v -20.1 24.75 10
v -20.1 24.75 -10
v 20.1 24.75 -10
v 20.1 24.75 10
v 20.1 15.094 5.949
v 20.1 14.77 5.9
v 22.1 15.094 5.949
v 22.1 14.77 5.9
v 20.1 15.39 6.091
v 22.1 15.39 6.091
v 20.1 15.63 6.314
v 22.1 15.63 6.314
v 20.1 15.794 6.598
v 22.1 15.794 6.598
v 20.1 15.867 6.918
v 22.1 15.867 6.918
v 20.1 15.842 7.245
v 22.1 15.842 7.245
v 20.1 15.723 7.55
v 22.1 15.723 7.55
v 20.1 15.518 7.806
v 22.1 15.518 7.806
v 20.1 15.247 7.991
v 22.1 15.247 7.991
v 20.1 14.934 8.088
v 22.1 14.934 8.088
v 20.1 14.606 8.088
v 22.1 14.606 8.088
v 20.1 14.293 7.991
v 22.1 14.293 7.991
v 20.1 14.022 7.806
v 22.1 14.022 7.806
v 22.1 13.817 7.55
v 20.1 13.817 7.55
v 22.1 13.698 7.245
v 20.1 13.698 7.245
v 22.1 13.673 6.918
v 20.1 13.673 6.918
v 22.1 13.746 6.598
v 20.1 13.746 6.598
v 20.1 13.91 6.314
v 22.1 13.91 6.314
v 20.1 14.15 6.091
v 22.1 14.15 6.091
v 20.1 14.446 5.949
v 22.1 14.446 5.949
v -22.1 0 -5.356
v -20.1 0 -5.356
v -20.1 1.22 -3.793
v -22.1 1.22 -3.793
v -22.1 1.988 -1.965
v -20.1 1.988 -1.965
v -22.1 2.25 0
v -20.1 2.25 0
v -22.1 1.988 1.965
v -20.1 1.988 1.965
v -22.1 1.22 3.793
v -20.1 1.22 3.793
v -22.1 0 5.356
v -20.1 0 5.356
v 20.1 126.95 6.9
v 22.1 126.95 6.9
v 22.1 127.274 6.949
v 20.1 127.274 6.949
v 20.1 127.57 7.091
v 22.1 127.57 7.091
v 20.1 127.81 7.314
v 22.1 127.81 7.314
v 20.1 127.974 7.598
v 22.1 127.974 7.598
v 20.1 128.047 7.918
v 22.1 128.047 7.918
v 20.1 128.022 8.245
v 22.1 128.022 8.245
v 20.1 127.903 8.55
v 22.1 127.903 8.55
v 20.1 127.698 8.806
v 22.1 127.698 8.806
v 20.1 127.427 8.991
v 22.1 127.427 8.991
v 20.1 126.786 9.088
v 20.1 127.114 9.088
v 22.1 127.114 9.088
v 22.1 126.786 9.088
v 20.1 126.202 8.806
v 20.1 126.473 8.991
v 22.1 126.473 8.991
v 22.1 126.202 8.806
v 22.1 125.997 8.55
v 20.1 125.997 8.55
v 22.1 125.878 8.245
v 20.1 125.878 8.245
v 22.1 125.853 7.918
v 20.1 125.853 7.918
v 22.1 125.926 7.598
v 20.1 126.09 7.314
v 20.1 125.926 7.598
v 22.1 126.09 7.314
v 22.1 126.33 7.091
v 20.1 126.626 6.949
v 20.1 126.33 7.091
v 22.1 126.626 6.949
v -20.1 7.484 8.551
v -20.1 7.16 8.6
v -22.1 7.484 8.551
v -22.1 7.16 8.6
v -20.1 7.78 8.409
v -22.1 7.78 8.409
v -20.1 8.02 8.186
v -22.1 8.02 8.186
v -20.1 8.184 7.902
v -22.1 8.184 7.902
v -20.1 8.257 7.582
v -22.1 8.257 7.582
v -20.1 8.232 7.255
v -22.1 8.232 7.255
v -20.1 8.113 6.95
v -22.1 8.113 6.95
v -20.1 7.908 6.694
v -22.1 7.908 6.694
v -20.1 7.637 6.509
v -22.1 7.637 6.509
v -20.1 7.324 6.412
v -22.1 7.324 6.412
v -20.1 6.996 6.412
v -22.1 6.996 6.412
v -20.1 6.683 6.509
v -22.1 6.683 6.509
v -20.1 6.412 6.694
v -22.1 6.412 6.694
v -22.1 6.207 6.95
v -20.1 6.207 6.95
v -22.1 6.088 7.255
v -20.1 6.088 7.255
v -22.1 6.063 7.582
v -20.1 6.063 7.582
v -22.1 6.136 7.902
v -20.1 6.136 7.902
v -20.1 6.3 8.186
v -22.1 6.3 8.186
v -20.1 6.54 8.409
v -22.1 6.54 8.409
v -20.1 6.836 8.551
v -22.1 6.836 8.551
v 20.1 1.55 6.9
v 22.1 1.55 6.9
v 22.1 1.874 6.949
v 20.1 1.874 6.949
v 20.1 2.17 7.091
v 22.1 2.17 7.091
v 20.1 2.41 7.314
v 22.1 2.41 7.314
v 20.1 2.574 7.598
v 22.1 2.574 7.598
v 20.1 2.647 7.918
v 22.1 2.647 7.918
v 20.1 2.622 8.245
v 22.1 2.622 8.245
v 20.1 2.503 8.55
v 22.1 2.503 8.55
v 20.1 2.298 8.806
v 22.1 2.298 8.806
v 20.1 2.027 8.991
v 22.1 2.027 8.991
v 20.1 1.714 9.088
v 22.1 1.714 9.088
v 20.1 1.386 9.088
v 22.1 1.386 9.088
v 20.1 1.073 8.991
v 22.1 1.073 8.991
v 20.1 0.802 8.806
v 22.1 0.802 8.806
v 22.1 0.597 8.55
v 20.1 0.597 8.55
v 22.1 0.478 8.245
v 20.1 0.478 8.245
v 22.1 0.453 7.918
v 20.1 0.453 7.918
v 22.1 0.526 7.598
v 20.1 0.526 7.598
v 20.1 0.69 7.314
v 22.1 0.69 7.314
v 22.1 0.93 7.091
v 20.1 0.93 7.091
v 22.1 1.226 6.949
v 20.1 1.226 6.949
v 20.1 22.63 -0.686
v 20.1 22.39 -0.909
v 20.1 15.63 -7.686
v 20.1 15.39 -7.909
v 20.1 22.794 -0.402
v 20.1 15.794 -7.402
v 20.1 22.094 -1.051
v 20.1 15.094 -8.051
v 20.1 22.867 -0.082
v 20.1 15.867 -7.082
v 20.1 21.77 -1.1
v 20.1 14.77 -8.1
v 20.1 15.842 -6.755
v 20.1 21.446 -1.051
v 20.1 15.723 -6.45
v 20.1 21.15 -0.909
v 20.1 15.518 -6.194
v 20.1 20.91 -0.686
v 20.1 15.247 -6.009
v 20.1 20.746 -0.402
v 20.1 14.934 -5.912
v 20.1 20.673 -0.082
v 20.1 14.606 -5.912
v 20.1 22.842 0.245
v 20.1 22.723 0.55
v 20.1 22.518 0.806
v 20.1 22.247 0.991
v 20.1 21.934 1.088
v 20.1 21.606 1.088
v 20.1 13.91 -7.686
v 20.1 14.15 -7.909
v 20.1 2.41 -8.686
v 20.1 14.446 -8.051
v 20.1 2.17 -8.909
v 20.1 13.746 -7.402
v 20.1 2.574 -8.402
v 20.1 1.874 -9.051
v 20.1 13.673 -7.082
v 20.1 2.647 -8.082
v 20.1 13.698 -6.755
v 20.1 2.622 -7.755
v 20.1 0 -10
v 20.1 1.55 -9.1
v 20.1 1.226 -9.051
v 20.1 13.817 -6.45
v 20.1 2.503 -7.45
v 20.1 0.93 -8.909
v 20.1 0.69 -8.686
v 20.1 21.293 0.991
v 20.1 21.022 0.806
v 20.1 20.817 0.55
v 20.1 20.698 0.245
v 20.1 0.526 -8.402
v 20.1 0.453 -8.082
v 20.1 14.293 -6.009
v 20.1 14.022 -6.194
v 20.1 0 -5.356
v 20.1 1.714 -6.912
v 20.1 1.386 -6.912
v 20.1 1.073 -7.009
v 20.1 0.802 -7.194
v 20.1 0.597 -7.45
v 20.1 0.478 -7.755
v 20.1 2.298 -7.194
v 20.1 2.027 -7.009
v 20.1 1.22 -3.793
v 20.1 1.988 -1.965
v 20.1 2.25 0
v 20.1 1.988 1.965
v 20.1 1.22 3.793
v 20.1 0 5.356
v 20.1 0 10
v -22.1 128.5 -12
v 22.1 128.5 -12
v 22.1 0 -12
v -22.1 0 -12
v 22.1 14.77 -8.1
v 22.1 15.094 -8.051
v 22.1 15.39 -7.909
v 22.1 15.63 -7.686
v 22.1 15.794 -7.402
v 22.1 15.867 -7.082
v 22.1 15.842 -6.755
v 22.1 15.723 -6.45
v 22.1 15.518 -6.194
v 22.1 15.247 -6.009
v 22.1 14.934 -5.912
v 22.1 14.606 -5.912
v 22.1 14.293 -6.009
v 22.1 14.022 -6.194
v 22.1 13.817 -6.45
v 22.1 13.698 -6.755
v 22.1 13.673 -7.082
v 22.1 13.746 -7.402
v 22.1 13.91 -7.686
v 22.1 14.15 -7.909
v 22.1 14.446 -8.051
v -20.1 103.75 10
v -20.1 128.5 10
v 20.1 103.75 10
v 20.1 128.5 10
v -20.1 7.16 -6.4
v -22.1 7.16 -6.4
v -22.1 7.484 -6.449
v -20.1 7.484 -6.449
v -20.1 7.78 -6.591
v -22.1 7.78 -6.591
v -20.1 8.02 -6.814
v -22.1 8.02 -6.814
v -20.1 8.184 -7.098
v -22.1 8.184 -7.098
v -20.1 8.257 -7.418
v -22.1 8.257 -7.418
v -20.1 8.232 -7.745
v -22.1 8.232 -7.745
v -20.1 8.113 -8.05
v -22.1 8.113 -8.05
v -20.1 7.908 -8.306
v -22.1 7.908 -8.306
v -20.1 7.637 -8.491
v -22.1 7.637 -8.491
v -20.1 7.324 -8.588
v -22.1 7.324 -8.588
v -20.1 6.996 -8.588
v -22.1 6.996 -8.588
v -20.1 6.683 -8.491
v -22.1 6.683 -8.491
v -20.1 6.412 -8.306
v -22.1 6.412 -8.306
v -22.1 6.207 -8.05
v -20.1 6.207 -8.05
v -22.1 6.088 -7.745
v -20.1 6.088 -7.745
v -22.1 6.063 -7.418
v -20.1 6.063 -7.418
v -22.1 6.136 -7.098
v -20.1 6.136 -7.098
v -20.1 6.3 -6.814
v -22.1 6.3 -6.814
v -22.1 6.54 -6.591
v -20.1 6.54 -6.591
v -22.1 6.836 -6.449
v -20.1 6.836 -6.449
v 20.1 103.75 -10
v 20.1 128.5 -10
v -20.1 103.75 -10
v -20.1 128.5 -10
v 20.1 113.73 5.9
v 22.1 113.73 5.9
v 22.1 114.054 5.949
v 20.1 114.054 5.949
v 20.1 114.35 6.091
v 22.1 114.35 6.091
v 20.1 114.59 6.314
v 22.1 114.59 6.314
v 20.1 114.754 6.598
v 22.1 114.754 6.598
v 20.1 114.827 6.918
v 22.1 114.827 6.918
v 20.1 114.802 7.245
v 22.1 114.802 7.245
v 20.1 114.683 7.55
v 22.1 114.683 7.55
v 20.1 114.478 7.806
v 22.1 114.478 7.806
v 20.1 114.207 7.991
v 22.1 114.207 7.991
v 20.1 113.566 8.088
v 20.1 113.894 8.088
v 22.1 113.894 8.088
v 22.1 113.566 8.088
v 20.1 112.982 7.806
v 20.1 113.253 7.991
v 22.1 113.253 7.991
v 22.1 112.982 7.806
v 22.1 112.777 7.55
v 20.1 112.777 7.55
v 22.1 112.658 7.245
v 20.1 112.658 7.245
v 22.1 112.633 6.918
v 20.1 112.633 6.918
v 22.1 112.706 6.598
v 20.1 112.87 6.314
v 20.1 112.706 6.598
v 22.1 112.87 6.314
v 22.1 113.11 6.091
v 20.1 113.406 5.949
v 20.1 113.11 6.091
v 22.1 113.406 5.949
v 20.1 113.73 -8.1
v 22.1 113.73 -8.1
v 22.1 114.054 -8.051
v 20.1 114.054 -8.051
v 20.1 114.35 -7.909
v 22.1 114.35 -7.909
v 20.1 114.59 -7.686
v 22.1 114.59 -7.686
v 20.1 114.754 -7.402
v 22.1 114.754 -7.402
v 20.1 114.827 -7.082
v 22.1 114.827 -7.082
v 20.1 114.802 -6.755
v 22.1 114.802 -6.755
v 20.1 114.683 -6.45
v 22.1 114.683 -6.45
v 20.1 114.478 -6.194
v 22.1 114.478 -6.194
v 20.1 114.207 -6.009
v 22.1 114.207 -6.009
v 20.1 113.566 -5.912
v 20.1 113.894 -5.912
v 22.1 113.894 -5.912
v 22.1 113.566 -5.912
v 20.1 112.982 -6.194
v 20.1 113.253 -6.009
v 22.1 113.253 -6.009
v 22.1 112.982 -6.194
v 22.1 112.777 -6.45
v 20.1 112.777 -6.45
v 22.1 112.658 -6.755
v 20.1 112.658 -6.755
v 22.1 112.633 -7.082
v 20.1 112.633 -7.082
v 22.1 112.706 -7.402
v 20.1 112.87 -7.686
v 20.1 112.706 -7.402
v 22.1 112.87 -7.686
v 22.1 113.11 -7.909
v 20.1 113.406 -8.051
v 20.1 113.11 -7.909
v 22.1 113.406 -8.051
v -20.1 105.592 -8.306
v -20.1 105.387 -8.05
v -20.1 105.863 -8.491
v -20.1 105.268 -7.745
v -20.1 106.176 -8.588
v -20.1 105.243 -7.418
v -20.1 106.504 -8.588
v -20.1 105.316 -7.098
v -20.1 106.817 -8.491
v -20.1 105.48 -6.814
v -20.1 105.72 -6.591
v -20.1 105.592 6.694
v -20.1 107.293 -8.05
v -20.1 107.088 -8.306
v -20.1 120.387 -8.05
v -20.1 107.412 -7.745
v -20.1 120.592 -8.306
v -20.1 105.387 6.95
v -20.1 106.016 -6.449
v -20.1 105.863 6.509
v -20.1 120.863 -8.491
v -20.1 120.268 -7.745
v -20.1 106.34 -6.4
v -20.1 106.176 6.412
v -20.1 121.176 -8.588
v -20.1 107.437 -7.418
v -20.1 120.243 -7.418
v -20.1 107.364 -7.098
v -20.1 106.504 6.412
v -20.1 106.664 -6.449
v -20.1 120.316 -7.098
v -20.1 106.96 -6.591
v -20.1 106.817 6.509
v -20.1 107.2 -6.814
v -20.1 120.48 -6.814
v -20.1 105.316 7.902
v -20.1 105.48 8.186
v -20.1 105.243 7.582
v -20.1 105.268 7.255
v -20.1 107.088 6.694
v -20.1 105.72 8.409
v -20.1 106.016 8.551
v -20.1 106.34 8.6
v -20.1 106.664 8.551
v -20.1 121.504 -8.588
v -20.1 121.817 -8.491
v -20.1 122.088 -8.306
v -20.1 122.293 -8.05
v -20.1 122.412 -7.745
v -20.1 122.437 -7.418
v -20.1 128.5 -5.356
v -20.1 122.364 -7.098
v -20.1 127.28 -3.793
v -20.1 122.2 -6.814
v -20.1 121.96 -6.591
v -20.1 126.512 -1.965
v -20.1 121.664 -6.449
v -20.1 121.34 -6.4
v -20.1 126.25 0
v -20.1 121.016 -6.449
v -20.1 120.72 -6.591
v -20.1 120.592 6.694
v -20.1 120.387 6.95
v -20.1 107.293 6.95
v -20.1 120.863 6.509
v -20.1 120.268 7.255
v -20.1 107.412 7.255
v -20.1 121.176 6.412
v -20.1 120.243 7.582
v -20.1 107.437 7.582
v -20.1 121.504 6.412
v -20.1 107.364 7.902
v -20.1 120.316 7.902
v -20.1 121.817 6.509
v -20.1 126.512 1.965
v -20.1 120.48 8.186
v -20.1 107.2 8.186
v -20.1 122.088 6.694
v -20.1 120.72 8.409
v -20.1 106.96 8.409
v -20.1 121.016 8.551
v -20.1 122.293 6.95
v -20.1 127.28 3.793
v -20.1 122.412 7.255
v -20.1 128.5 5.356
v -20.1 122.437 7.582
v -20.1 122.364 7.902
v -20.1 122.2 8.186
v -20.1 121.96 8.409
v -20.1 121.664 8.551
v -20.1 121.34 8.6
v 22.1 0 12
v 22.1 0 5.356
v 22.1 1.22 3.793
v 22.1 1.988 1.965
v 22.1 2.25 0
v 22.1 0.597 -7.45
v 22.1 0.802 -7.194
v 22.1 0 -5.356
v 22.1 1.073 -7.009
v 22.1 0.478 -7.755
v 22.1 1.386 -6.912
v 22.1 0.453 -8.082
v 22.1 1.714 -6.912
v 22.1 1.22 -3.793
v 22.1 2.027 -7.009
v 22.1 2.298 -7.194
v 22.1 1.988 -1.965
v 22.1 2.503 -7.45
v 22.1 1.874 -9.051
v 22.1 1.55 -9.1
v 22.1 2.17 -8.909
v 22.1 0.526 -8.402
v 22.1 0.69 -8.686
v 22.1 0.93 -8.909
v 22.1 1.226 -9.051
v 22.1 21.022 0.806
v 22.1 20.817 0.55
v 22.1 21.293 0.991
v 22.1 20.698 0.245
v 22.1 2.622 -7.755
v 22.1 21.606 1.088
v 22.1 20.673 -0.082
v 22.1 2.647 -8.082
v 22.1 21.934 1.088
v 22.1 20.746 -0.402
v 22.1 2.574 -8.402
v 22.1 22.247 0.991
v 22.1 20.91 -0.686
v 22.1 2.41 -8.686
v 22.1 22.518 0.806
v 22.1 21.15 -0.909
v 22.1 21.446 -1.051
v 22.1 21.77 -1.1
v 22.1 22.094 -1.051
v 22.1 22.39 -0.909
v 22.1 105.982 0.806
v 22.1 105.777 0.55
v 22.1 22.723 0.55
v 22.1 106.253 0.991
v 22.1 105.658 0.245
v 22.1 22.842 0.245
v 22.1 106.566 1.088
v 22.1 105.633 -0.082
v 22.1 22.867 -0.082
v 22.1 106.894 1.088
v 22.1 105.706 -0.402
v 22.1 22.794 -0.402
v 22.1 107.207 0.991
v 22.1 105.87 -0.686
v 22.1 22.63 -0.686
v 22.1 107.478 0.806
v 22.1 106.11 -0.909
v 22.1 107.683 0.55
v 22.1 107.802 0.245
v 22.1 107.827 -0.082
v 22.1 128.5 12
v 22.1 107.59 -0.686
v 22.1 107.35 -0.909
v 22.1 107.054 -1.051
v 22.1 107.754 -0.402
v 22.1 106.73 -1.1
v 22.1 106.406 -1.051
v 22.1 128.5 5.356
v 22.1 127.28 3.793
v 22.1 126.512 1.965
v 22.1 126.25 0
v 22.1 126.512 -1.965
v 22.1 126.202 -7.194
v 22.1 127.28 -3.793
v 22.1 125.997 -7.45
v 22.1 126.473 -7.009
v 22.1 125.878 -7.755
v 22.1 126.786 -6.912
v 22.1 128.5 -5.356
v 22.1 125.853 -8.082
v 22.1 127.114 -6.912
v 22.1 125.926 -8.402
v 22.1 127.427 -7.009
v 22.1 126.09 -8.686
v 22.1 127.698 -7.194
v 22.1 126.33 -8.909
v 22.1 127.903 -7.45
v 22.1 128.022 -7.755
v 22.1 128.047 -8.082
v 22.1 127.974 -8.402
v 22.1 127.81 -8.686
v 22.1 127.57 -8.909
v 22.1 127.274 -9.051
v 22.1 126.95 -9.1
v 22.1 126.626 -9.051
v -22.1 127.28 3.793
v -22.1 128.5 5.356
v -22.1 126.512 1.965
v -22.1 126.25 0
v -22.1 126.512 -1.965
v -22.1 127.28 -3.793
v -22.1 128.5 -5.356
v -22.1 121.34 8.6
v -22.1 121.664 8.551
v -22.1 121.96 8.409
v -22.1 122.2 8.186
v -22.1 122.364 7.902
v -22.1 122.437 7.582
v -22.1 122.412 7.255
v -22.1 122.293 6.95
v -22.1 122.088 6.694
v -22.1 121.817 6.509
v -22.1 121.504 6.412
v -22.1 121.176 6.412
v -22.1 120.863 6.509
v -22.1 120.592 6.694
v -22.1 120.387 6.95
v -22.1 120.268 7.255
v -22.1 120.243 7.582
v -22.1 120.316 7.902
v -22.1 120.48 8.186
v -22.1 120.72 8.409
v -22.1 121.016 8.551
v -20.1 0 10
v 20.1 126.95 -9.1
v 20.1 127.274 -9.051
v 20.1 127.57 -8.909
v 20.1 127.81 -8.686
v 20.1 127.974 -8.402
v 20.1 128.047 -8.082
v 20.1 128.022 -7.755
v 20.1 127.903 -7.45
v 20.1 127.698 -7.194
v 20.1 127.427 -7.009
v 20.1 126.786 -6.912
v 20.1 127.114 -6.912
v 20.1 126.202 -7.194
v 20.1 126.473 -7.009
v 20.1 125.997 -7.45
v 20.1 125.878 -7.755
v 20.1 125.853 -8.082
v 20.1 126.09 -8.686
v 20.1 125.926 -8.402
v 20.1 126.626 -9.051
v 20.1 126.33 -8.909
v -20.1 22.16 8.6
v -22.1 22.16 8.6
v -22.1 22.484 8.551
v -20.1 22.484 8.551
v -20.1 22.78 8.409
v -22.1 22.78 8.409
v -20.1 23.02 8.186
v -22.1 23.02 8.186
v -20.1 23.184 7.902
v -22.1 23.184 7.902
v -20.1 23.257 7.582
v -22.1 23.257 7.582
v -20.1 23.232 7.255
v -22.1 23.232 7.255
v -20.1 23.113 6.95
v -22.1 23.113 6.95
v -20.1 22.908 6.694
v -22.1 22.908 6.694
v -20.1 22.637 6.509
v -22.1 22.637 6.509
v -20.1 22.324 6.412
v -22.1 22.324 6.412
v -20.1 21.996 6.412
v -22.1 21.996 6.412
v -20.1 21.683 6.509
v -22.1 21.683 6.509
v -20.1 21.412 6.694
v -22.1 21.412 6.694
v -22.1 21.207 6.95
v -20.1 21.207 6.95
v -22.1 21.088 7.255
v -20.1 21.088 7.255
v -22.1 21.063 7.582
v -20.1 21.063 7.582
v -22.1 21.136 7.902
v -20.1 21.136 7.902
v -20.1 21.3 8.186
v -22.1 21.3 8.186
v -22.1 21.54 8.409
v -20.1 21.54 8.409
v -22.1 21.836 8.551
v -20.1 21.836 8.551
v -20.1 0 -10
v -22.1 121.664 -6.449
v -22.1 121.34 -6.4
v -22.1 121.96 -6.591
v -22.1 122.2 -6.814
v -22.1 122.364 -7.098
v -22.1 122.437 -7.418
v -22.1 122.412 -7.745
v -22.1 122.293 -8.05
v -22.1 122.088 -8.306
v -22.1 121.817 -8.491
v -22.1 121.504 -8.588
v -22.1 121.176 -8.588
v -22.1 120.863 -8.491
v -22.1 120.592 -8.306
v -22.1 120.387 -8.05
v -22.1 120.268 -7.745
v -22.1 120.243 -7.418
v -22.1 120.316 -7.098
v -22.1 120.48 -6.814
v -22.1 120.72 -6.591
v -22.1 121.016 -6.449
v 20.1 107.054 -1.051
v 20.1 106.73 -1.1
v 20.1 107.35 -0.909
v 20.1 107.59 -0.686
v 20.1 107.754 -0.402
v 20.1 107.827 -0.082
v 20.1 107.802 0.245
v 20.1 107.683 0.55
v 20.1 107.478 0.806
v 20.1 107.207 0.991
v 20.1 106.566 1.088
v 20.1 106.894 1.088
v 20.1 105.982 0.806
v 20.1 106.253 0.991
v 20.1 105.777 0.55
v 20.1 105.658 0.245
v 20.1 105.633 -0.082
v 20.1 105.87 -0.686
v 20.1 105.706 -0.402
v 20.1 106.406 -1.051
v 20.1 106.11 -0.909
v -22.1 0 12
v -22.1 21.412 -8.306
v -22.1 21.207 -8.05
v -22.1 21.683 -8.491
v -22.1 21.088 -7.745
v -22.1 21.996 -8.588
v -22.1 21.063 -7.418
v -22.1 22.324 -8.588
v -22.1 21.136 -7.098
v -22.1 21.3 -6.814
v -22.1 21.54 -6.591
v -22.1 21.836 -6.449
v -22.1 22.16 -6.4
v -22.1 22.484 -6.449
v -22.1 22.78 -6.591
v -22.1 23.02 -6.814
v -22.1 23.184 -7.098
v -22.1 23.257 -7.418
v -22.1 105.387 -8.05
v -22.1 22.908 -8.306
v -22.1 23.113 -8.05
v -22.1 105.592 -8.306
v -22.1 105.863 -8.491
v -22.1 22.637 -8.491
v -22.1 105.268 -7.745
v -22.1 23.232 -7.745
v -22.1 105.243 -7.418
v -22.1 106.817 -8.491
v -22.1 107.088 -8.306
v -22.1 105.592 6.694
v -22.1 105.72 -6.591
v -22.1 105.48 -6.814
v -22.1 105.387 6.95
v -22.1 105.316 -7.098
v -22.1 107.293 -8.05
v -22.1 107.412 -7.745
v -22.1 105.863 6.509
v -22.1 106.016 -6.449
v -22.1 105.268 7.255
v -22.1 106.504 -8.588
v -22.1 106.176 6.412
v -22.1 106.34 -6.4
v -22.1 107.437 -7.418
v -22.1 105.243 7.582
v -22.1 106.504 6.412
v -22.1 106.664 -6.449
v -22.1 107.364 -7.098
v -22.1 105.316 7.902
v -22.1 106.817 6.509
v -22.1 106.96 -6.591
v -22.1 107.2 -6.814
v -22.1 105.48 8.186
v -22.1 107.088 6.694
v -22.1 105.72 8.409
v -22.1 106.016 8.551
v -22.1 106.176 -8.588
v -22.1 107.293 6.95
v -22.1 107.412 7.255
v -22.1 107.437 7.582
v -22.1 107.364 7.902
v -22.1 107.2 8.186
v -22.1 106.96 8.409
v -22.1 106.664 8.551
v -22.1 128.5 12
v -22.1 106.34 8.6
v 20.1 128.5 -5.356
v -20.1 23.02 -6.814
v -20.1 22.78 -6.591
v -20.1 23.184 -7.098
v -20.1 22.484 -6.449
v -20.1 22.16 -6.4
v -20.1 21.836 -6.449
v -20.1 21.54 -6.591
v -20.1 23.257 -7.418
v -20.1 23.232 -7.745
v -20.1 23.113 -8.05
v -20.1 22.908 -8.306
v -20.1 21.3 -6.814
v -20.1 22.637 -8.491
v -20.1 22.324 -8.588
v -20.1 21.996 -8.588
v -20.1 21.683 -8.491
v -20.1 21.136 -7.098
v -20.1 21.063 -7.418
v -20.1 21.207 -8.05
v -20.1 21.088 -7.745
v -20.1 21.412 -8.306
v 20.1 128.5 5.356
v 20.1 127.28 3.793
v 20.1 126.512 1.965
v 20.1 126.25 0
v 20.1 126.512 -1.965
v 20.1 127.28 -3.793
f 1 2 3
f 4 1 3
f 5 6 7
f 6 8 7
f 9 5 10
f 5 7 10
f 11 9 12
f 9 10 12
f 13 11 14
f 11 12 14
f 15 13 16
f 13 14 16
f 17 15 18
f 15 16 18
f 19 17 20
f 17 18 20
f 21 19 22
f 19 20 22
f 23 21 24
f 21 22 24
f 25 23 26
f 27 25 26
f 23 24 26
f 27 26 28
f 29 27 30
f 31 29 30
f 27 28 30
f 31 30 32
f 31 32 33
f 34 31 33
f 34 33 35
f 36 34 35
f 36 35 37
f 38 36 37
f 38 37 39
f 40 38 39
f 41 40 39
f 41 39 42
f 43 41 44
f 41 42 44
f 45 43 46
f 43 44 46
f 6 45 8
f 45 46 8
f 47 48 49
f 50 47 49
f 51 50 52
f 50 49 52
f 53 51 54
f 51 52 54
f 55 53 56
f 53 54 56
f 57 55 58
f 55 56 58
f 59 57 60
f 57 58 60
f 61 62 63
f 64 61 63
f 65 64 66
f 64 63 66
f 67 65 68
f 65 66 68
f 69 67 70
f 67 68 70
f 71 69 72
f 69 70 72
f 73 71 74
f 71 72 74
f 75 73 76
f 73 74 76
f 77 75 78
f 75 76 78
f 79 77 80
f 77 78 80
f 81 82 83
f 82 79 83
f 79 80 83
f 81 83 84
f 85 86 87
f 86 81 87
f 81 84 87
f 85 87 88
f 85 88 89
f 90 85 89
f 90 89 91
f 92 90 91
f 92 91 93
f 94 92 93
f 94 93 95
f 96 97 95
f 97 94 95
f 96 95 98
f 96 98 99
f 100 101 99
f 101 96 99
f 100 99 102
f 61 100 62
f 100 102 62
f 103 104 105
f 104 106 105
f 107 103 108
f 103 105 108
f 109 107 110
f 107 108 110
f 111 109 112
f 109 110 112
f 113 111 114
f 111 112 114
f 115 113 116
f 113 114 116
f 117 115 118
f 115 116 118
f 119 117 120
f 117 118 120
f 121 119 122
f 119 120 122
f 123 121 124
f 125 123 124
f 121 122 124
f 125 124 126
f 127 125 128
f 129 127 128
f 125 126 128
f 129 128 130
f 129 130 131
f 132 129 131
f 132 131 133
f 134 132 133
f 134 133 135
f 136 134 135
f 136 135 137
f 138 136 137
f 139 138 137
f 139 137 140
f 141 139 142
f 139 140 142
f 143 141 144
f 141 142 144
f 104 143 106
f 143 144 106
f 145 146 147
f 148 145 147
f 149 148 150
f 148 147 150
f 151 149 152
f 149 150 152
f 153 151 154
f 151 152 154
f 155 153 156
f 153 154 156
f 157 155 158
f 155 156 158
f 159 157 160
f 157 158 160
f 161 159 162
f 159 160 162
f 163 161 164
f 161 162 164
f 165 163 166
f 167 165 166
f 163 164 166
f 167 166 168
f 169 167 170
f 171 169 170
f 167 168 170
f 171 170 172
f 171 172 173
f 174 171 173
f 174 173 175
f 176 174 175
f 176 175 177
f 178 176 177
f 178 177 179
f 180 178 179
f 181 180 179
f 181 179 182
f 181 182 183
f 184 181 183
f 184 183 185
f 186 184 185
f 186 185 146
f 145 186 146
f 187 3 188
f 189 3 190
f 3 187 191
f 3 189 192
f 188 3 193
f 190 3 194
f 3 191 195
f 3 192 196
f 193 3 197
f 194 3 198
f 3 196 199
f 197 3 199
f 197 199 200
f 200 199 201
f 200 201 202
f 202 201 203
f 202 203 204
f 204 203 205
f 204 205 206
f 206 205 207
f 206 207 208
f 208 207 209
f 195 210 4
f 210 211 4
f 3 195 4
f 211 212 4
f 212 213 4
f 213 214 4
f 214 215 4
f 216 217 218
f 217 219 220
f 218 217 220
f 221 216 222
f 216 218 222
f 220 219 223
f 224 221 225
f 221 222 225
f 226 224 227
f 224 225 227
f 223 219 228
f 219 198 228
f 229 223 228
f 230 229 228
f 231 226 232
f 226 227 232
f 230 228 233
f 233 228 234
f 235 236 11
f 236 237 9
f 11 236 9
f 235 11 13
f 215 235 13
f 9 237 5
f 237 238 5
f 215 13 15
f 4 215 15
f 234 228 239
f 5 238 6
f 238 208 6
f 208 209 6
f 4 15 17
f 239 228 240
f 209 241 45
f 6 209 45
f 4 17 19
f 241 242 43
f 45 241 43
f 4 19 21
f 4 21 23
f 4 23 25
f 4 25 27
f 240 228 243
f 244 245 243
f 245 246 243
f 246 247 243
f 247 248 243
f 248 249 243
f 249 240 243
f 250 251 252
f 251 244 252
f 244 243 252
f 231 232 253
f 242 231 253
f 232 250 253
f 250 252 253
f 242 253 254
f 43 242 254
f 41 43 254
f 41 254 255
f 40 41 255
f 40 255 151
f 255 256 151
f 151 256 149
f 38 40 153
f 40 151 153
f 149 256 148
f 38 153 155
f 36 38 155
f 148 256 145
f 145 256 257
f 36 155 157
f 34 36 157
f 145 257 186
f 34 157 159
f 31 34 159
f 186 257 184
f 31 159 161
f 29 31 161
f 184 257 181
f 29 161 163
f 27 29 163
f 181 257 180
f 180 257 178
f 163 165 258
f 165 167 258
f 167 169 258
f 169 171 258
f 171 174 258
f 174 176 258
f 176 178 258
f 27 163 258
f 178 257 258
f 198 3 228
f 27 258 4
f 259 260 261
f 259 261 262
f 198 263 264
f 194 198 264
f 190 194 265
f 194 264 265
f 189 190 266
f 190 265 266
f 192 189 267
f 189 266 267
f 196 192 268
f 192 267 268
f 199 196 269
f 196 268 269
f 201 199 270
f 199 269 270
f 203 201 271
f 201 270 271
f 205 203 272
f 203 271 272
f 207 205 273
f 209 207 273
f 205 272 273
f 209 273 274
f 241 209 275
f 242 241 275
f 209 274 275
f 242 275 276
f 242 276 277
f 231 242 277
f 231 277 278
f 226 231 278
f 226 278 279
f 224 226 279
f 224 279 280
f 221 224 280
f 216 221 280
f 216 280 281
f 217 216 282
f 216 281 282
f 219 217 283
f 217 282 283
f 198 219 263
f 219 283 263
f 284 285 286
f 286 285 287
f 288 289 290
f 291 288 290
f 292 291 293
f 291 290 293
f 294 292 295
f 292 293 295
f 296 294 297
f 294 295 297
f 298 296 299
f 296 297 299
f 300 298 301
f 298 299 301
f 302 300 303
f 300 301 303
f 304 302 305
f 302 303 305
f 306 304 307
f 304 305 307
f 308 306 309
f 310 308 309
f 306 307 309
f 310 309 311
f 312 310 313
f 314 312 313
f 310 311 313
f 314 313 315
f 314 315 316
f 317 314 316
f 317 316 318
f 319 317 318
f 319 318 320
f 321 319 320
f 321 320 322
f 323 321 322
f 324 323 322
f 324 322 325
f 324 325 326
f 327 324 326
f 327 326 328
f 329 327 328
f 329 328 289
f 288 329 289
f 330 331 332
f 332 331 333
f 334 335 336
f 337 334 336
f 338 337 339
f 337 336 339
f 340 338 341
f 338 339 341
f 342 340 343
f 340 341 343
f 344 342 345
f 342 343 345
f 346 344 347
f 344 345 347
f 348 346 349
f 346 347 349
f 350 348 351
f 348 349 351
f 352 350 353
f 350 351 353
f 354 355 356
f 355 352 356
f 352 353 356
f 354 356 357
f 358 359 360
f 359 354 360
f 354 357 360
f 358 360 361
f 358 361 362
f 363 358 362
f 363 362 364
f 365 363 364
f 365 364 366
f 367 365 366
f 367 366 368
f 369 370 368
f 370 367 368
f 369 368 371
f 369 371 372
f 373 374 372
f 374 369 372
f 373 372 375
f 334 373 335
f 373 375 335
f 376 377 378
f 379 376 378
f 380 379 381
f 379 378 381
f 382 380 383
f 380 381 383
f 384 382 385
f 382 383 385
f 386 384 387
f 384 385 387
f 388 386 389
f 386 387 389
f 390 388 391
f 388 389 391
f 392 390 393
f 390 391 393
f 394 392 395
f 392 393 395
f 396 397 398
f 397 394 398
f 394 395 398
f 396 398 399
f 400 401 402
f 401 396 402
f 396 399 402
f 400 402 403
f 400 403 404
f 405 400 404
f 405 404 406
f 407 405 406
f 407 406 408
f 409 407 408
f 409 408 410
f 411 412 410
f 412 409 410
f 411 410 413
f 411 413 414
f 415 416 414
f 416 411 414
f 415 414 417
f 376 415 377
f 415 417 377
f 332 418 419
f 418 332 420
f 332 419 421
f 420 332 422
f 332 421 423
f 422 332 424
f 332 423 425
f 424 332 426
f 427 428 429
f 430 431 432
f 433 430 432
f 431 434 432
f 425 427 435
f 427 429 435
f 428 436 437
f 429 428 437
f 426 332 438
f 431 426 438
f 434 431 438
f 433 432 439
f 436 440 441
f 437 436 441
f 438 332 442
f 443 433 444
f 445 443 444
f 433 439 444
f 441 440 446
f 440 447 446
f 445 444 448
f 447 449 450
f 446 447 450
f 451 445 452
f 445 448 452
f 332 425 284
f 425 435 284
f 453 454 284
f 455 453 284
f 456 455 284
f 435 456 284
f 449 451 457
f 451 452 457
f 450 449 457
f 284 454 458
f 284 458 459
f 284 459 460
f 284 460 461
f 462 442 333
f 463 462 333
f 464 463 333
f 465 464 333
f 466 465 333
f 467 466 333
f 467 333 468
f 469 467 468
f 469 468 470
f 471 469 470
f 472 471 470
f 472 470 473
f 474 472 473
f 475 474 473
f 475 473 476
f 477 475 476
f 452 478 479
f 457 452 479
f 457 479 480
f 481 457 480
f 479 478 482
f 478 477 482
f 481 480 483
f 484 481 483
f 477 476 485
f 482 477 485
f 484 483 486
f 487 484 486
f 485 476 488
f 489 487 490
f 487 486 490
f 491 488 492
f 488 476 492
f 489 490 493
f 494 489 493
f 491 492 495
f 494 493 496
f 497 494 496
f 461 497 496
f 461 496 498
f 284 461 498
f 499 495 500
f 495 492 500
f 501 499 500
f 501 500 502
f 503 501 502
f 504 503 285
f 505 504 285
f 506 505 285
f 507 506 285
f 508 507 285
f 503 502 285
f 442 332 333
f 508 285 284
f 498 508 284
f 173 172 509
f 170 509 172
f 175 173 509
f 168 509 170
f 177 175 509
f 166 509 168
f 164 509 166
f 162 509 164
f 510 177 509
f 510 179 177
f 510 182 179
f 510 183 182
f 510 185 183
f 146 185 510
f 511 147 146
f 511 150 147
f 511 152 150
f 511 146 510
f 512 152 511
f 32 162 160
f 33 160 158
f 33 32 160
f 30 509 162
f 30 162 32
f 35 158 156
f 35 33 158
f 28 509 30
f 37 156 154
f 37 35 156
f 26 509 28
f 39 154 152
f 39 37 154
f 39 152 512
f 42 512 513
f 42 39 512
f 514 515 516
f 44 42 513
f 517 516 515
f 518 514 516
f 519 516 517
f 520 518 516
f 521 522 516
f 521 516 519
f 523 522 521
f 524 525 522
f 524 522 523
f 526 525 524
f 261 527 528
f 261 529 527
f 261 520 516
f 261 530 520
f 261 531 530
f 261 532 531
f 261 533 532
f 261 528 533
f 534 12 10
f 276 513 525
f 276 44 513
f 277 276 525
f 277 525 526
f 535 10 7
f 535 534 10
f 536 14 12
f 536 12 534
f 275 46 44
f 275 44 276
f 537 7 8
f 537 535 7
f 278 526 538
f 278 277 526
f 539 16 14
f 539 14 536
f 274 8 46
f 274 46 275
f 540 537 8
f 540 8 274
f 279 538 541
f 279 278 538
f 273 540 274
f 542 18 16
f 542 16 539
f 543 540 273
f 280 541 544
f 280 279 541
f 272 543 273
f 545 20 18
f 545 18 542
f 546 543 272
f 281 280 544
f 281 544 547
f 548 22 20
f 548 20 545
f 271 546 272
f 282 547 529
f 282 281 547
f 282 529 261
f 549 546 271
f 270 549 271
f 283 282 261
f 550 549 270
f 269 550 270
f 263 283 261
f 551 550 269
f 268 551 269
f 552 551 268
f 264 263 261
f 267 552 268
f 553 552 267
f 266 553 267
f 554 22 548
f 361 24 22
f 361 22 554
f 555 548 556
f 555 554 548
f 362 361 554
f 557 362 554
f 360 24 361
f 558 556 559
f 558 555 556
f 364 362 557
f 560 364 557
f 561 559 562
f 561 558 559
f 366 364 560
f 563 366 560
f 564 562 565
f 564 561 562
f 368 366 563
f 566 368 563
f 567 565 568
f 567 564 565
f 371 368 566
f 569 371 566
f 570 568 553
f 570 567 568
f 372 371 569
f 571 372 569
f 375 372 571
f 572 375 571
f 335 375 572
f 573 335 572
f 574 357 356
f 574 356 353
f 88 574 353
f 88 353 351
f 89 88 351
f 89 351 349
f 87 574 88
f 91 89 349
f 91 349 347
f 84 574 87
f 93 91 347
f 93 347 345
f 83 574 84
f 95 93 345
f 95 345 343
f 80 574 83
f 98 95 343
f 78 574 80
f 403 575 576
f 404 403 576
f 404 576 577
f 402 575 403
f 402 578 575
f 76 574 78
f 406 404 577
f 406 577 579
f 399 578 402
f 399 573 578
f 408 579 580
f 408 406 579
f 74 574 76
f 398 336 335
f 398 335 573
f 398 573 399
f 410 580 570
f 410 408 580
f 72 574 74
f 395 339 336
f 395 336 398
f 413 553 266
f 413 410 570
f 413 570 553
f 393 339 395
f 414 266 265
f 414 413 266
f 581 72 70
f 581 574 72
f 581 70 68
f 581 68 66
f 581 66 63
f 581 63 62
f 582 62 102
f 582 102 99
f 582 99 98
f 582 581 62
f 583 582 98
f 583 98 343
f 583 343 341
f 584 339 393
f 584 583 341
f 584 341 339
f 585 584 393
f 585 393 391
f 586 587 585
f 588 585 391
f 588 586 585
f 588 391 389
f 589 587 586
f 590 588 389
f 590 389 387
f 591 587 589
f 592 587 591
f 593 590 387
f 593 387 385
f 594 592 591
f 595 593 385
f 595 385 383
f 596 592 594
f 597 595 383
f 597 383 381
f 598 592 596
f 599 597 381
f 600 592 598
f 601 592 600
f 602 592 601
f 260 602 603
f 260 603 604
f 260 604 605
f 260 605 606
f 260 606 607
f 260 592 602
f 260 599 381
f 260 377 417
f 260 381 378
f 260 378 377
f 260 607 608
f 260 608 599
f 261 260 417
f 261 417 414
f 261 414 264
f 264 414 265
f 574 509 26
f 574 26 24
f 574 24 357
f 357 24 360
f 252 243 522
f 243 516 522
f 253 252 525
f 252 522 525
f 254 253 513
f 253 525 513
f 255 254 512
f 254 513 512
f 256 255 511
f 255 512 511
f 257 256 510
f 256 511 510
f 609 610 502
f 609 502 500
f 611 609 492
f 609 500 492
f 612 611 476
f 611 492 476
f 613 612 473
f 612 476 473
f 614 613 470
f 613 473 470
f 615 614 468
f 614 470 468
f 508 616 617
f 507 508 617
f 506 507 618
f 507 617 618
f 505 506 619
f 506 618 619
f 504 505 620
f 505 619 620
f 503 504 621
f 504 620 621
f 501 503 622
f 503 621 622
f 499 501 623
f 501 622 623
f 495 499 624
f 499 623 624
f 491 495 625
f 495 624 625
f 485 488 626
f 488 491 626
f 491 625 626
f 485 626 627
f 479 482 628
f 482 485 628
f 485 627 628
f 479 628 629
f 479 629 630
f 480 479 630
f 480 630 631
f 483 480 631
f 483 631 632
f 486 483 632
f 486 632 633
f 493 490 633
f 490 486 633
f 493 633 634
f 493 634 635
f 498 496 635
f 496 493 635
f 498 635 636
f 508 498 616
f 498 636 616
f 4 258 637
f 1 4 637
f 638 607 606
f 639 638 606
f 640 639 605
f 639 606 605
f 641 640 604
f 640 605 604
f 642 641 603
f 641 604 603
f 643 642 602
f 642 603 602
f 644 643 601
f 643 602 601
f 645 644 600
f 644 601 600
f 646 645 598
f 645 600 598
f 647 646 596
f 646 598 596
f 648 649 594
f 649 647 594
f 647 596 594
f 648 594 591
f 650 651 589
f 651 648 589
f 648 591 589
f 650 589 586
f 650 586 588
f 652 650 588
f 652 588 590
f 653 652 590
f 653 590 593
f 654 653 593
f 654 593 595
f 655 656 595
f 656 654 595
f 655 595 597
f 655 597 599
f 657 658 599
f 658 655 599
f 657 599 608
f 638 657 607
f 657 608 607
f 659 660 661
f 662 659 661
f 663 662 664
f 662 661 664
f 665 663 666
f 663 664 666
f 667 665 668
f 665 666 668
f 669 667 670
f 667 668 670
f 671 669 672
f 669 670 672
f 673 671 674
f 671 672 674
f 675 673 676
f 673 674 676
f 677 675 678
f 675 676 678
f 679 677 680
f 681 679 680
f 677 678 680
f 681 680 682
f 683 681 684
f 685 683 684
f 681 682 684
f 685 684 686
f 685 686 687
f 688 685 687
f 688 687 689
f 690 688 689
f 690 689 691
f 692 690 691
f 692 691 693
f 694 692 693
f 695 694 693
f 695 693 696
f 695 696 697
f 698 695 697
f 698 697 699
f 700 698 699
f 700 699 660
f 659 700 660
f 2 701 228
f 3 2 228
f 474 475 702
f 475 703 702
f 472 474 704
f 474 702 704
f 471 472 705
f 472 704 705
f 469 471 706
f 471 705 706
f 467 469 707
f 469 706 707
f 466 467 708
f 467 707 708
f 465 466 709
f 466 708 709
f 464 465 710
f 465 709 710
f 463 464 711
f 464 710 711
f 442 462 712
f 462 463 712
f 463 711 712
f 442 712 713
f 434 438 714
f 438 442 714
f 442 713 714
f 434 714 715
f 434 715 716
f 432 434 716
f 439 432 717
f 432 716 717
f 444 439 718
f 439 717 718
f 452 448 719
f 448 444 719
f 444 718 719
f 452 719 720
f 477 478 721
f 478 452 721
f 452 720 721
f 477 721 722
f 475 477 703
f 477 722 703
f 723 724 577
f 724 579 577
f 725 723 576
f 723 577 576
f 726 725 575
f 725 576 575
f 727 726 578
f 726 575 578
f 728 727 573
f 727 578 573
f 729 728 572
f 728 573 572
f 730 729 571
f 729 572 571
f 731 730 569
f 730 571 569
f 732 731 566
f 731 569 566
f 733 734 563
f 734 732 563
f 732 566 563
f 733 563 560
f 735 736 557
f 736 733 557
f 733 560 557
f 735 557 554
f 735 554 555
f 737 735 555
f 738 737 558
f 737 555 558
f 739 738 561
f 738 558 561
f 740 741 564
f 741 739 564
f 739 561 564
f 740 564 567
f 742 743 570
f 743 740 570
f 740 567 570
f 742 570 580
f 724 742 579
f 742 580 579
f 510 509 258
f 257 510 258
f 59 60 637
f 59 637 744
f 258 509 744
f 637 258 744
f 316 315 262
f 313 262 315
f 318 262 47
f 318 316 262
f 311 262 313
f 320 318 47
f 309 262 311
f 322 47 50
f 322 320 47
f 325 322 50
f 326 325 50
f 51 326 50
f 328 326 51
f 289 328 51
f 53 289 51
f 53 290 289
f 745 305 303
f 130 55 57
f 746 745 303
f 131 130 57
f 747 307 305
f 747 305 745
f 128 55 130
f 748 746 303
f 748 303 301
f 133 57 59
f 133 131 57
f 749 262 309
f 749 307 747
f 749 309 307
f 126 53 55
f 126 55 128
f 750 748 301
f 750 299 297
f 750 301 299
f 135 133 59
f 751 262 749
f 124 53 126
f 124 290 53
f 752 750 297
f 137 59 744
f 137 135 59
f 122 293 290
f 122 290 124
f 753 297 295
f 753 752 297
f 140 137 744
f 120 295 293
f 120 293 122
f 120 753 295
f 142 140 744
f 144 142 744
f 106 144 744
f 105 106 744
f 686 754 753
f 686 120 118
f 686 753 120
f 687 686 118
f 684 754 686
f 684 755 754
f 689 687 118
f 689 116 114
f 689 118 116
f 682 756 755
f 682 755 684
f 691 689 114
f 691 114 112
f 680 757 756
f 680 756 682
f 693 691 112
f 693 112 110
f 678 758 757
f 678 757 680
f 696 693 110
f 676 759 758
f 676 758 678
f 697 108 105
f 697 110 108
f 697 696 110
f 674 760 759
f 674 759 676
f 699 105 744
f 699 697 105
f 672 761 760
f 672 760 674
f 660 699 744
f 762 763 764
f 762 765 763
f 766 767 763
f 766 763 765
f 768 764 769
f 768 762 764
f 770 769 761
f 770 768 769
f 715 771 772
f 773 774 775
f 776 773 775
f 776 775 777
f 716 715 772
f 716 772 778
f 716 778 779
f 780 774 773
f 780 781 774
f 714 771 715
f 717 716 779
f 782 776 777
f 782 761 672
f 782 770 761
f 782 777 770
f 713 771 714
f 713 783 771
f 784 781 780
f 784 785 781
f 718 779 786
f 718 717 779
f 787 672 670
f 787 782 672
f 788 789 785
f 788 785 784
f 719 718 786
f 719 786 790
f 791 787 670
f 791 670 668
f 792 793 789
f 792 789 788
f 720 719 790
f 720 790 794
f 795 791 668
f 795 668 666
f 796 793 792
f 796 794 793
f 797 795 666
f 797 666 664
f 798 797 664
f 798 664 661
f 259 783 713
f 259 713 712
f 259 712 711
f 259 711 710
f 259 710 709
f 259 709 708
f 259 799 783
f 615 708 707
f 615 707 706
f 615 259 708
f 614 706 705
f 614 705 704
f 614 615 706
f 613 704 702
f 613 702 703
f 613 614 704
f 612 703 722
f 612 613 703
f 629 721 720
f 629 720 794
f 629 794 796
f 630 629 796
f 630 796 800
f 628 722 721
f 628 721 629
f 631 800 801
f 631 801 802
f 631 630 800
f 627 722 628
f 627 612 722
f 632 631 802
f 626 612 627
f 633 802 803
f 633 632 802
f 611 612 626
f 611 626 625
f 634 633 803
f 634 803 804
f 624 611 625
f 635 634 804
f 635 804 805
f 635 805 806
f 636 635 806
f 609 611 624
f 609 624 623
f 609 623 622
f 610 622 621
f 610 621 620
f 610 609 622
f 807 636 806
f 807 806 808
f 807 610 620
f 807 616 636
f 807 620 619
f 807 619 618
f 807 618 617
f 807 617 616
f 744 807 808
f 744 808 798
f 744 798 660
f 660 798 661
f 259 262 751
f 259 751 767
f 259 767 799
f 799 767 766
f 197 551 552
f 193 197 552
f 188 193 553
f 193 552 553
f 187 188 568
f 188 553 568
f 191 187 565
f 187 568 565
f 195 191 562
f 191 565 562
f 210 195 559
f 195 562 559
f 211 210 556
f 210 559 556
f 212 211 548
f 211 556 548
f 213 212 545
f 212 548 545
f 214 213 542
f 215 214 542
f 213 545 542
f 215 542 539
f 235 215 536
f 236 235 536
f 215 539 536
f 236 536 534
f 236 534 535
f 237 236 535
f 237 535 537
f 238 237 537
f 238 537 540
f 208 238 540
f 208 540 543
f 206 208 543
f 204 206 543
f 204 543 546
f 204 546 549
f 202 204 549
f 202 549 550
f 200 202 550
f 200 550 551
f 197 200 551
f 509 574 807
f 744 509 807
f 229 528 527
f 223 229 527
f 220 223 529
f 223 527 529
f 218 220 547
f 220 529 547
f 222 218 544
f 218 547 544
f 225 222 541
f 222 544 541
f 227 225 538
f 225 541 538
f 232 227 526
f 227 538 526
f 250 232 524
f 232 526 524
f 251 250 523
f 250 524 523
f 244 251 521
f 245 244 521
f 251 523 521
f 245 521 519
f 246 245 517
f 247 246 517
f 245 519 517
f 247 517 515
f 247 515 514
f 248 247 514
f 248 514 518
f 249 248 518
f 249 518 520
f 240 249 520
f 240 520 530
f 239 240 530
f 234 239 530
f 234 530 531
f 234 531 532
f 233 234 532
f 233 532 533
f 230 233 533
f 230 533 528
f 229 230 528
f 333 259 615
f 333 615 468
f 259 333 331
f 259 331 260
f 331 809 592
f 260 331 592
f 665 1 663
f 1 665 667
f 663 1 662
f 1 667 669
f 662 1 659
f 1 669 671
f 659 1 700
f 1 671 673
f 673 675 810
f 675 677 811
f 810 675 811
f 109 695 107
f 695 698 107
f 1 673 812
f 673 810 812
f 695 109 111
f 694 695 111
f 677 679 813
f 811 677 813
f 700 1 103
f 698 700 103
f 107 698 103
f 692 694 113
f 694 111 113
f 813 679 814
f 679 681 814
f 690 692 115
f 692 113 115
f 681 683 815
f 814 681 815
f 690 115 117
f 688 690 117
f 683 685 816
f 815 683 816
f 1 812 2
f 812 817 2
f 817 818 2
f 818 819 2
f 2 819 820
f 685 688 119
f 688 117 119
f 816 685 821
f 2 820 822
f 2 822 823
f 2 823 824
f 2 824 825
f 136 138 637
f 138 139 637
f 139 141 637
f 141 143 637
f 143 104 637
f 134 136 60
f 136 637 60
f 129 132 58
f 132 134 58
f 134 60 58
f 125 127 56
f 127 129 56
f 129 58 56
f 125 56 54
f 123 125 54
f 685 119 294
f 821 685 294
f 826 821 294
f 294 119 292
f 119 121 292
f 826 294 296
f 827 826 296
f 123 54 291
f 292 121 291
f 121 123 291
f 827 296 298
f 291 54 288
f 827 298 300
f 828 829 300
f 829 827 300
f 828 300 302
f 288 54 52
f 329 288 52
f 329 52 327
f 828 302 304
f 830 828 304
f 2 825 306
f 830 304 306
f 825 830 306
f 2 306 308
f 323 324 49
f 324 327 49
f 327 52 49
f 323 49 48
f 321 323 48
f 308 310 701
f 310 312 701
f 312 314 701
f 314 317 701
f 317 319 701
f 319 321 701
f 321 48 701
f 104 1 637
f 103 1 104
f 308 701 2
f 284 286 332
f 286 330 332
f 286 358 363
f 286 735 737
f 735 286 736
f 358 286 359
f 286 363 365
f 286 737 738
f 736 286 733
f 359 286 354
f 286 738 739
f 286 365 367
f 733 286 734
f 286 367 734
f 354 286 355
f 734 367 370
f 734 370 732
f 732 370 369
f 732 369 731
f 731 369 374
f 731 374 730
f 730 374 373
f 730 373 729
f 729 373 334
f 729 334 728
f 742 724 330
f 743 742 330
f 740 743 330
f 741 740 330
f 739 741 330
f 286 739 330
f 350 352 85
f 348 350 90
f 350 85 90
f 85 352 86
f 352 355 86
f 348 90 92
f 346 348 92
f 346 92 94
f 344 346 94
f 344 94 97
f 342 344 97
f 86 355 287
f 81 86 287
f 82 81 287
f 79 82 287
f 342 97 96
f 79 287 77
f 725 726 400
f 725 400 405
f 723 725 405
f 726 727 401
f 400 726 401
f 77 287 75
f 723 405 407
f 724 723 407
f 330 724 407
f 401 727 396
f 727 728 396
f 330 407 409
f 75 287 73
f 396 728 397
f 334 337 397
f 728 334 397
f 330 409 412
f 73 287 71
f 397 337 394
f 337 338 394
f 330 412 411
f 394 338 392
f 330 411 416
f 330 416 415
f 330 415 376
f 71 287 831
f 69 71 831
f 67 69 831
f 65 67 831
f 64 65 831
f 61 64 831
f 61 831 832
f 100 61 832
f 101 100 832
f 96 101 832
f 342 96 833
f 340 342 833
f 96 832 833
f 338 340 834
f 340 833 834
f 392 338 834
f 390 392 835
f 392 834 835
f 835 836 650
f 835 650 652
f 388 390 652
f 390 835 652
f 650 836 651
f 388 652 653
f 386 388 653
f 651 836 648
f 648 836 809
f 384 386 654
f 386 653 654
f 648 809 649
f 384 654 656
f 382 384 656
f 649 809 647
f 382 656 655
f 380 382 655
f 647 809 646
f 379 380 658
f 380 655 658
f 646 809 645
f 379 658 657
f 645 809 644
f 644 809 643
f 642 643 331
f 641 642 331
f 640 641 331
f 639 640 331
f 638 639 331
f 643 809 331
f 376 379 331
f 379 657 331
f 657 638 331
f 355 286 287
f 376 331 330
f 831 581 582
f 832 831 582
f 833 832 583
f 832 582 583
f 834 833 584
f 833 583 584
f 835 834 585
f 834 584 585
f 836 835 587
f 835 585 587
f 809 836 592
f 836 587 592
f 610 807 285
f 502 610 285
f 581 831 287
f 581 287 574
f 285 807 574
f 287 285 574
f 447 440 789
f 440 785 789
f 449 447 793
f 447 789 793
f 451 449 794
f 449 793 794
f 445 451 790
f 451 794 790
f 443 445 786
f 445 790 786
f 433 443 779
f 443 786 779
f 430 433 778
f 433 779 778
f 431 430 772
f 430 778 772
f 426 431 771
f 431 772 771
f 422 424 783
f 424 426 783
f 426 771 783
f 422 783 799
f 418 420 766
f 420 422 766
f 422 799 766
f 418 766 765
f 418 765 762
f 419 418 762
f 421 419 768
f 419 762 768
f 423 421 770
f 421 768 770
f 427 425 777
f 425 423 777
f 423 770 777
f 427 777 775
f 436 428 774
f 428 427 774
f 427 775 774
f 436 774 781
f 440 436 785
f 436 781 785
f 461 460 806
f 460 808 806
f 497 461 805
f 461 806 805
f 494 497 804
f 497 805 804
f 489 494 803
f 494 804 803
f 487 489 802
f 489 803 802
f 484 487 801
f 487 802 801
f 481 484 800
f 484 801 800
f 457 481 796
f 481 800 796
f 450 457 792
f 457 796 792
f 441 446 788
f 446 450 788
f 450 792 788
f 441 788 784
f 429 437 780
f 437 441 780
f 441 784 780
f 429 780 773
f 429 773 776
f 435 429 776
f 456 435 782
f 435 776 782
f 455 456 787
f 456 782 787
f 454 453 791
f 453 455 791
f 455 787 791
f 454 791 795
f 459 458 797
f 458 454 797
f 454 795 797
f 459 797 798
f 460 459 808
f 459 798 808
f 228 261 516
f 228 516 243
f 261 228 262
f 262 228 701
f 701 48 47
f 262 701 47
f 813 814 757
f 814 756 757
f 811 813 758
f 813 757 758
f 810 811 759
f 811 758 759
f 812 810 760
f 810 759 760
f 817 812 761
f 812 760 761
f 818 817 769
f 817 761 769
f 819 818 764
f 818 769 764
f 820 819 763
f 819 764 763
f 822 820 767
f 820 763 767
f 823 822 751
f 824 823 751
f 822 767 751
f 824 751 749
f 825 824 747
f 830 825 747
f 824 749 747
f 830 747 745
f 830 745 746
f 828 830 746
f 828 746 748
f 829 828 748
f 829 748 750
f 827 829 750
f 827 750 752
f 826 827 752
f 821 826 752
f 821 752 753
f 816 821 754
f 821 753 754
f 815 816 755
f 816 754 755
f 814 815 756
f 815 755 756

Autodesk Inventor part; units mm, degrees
ref_plane "РабПлоскость1" through (0, 48, 0) normal (0, 1, 0) x (1, 0, 0)
ref_plane "YZ Plane" through (0, 0, 0) normal (1, 0, 0) x (0, 1, 0)
sketch "Эскиз2" plane through (0, 0, 0) normal (0, 1, 0) x (-1, 0, 0)
  line L0 (20.1, -10) -> (-20.1, -10)
  line L1 (-20.1, -10) -> (-20.1, 10)
  line L2 (-20.1, 10) -> (20.1, 10)
  line L3 (20.1, 10) -> (20.1, -10)
  line L4 (20.1, -10) -> (-20.1, 10) construction
  line L5 (-20.1, -10) -> (20.1, 10) construction
  line L6 (22.1, 12) -> (-22.1, 12)
  line L7 (-22.1, 12) -> (-22.1, -12)
  line L8 (-22.1, -12) -> (22.1, -12)
  line L9 (22.1, -12) -> (22.1, 12)
  line L10 (22.1, 12) -> (-22.1, -12) construction
  line L11 (-22.1, 12) -> (22.1, -12) construction
  point P0 (0, 0)
  dimension "d5" = 40.2
  dimension "d6" = 20
  dimension "d7" = 2
  dimension "d8" = 2
extrude "Выдавливание1" add sketch "Эскиз2" along normal blind 24.75
sketch "Эскиз4" plane through (22.1, 0, 12) normal (1, 0, 0) x (0, 0, -1)
  line L0 (0, 0) -> (24, 0) projected
  line L1 (24, 0) -> (24, 24.75) projected
  line L2 (0, 24.75) -> (24, 24.75) projected
  line L3 (0, 0) -> (0, 24.75) projected
  line L4 (22, 24.75) -> (2, 24.75) projected
  line L5 (12, 24.75) -> (12, 1.55) construction
  line L6 (12, 1.55) -> (20, 1.55) construction
  circle A0 centre (20, 1.55) radius 1.1
  line L7 (12, 14.77) -> (19, 14.77) construction
  circle A1 centre (19, 14.77) radius 1.1
  circle A2 centre (12, 21.77) radius 1.1
  circle A3 centre (4, 1.55) radius 1.1
  line L8 (12, 14.77) -> (5, 14.77) construction
  circle A4 centre (5, 14.77) radius 1.1
  line L9 (12, 1.55) -> (4, 1.55) construction
  point P0 (12, 0)
  dimension "d13" = 23.2
  dimension "d14" = 8
  dimension "d15" = 2.2
  dimension "d16" = 7
  dimension "d17" = 13.22
  dimension "d18" = 7
extrude "Выдавливание3" cut sketch "Эскиз4" against normal blind 2 contours A0 | A1 | A2 | A3 | A4
sketch "Эскиз5" plane through (-22.1, 0, -12) normal (-1, 0, 0) x (0, 0, 1)
  line L0 (0, 0) -> (24, 0) projected
  line L1 (24, 0) -> (24, 24.75) projected
  line L2 (0, 24.75) -> (24, 24.75) projected
  line L3 (0, 0) -> (0, 24.75) projected
  line L4 (24, 24.75) -> (0, 24.75) projected
  line L5 (12, 24.75) -> (12, 5.2772) construction
  circle A0 centre (19.5, 22.16) radius 1.1
  line L6 (19.5, 22.16) -> (12, 22.16) construction
  circle A1 centre (4.5, 22.16) radius 1.1
  circle A2 centre (19.5, 7.16) radius 1.1
  circle A3 centre (4.5, 7.16) radius 1.1
  point P0 (12, 0)
  dimension "d21" = 2.59
  dimension "d22" = 7.5
  dimension "d23" = 2.2
  dimension "d26" = 15
  dimension "d29" = 15
extrude "Выдавливание4" cut sketch "Эскиз5" against normal blind 2 contours A0 | A1 | A2 | A3
sketch "Эскиз3" plane through (0, 24.75, 0) normal (0, 1, 0) x (1, 0, 0)
  line L0 (-22.1, -12) -> (22.1, -12) projected
  line L1 (22.1, -12) -> (-22.1, -12)
  line L2 (-22.1, -12) -> (-22.1, 12)
  line L3 (-22.1, 12) -> (22.1, 12)
  line L4 (22.1, 12) -> (22.1, -12)
  point P0 (0, 0)
extrude "Выдавливание2" add sketch "Эскиз3" along normal blind 2
ref_plane "РабПлоскость3" through (-22.1, 26.75, -12) normal (0, 1, 0) x (1, 0, 0)
sketch "Эскиз7" plane through (0, 26.75, 0) normal (0, 1, 0) x (1, 0, 0)
  line L0 (22.1, -12) -> (22.1, 12) projected
  line L1 (-22.1, 12) -> (-22.1, -12) projected
  line L2 (22.1, -12) -> (-22.1, -12)
  line L3 (-22.1, -12) -> (-22.1, 12)
  line L4 (-22.1, 12) -> (22.1, 12)
  line L5 (22.1, 12) -> (22.1, -12)
  point P0 (0, 0)
extrude "Выдавливание5" add sketch "Эскиз7" along normal blind 75
ref_plane "РабПлоскость5" through (0, 64.25, 0) normal (0, 1, 0) x (1, 0, 0)
mirror "Зеркальное отражение2" about plane through (0, 64.25, 0) normal (0, 1, 0) of "Выдавливание3", "Выдавливание1", "Выдавливание4", "Выдавливание2"
sketch "Эскиз9" plane through (22.1, 0, 12) normal (1, 0, 0) x (0, 0, -1)
  circle A0 centre (20, 126.95) radius 1.1 construction
  circle A1 centre (4, 126.95) radius 1.1 construction
  circle A2 centre (19, 113.73) radius 1.1 construction
  circle A3 centre (5, 113.73) radius 1.1 construction
  circle A4 centre (12, 106.73) radius 1.1 construction
  circle A5 centre (20, 1.55) radius 1.1 construction
  circle A6 centre (4, 1.55) radius 1.1 construction
  circle A7 centre (19, 14.77) radius 1.1 construction
  circle A8 centre (5, 14.77) radius 1.1 construction
  circle A9 centre (12, 21.77) radius 1.1 construction
  line L0 (0, 0) -> (24, 0) construction
  line L1 (24, 0) -> (24, 128.5) construction
  line L2 (0, 128.5) -> (24, 128.5) construction
  line L3 (0, 0) -> (0, 128.5) construction
  line L4 (0, 0) -> (0, 128.5) construction
  line L5 (0, 64.25) -> (24, 64.25) construction
  circle A10 centre (12, -5.25) radius 7.5
  line L6 (12, -5.25) -> (12, 0) construction
  circle A11 centre (12, 133.75) radius 7.5
  dimension "d46" = 15
  dimension "d47" = 5.25
extrude "Выдавливание6" cut sketch "Эскиз9" against normal up to surface (44.2 mm away)
sketch "Эскиз6" plane through (0, 48, 0) normal (0, 1, 0) x (1, 0, 0)
  line L0 (-12, -22.1) -> (12, -22.1)
  line L1 (12, -22.1) -> (12, 22.1)
  line L2 (12, 22.1) -> (-12, 22.1)
  line L3 (-12, 22.1) -> (-12, -22.1)
  line L4 (-12, -22.1) -> (12, 22.1) construction
  line L5 (12, -22.1) -> (-12, 22.1) construction
  point P0 (0, 0)
  dimension "d35" = 44.2
  dimension "d36" = 24
equation "\"d48\" = d46"
properties part number "мотор_локтя_2.1-кисти_1"
